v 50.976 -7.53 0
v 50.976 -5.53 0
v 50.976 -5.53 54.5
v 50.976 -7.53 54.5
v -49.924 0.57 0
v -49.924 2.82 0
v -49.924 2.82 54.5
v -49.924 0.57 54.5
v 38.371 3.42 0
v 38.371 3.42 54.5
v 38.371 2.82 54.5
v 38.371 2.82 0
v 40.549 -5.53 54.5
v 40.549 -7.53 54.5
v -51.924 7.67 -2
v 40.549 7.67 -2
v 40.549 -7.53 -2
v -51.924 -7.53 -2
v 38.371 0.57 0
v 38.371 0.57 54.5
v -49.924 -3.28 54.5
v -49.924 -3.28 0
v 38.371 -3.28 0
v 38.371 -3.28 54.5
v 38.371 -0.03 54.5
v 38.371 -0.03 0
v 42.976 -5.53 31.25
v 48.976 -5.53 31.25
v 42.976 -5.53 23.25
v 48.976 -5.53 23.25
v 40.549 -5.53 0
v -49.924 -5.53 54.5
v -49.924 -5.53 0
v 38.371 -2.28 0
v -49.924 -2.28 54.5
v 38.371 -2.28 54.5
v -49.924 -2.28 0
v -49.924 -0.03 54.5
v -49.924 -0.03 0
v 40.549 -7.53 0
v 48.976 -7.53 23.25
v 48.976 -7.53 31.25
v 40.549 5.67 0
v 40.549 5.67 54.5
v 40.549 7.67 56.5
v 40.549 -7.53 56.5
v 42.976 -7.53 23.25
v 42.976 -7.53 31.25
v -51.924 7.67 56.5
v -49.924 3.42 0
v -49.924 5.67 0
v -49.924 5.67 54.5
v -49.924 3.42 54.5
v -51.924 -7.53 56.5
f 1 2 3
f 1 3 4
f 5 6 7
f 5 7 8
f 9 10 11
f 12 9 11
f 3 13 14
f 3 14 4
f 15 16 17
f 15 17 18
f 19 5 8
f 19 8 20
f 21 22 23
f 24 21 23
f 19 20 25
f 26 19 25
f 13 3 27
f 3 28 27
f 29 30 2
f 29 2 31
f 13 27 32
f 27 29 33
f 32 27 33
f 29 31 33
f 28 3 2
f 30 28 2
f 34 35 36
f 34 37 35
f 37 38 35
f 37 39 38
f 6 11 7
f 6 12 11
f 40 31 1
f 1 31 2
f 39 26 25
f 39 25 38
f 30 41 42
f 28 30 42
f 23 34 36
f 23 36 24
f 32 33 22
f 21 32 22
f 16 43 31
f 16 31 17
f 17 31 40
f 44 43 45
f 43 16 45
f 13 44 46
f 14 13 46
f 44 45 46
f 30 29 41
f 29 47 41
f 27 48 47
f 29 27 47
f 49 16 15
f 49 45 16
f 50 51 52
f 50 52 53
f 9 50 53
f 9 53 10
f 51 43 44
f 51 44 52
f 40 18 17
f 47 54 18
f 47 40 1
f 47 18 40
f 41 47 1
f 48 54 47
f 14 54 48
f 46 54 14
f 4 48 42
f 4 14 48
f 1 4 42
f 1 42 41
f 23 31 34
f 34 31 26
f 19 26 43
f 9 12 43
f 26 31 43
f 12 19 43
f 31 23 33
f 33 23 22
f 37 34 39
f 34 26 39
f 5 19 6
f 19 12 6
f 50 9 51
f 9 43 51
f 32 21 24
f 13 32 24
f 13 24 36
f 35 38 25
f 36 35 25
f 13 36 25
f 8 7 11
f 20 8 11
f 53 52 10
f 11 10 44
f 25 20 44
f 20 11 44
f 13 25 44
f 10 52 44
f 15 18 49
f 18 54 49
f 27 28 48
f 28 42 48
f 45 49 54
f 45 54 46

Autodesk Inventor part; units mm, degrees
ref_plane "YZ Plane" through (0, 0, 0) normal (1, 0, 0) x (0, 1, 0)
ref_plane "XZ Plane" through (0, 0, 0) normal (0, 1, 0) x (-1, 0, 0)
ref_plane "XY Plane" through (0, 0, 0) normal (0, 0, 1) x (1, 0, 0)
sketch "Sketch1" plane through (0, 0, 0) normal (0, 0, 1) x (1, 0, 0)
  line L0 (-51.9238, 7.67) -> (40.5487, 7.67)
  line L1 (50.9762, -5.53) -> (50.9762, -7.53)
  line L2 (50.9762, -7.53) -> (-51.9238, -7.53)
  line L3 (-51.9238, -7.53) -> (-51.9238, 7.67)
  line L4 (-51.9238, 7.67) -> (50.9762, -7.53) construction
  line L5 (50.8142, 7.3691) -> (-51.9238, -7.53) construction
  line L6 (40.55, -5.53) -> (50.9762, -5.53)
  line L7 (40.5487, 5.67) -> (-49.9238, 5.67)
  line L8 (-49.9238, 5.67) -> (-49.9238, 3.42)
  line L9 (-49.9238, 3.42) -> (38.3707, 3.42)
  line L10 (40.5487, 7.67) -> (40.5487, 5.8804)
  line L11 (40.55, -5.53) -> (-49.9238, -5.53)
  line L12 (-49.9238, -5.53) -> (-49.9238, -3.28)
  line L13 (-49.9238, -3.28) -> (38.3707, -3.28)
  line L14 (40.5487, 5.8804) -> (40.5487, 5.67)
  line L15 (38.3707, 2.82) -> (-49.9238, 2.82)
  line L16 (-49.9238, 2.82) -> (-49.9238, 0.57)
  line L17 (-49.9238, 0.57) -> (38.3707, 0.57)
  line L18 (38.3707, 3.42) -> (38.3707, 2.82)
  line L19 (38.3707, -0.03) -> (-49.9238, -0.03)
  line L20 (-49.9238, -0.03) -> (-49.9238, -2.28)
  line L21 (-49.9238, -2.28) -> (38.3707, -2.28)
  line L22 (38.3707, 0.57) -> (38.3707, -0.03)
  line L23 (38.3707, -2.28) -> (38.3707, -3.28)
  point P0 (0, 0)
  dimension "d0" = 102.9
  dimension "d1" = 14.9
  dimension "d3" = 2
  dimension "d4" = 2
  dimension "d5" = 2.25
  dimension "d6" = 2
  dimension "d7" = 2
  dimension "d8" = 2.25
  dimension "d10" = 0.6
  dimension "d11" = 2.25
  dimension "d12" = 2
  dimension "d13" = 0.6
  dimension "d14" = 2.25
  dimension "d15" = 1
  dimension "d16" = 2
extrude "Extrusion1" add sketch "Sketch1" along normal blind 54.5
sketch "Sketch2" plane through (0, 0, 54.5) normal (0, 0, 1) x (1, 0, 0)
  line L0 (-51.9238, 7.67) -> (40.5487, 7.67) projected
  line L1 (50.9762, -7.53) -> (-51.9238, -7.53) projected
  line L2 (40.5487, 7.67) -> (-51.9238, 7.67)
  line L3 (-51.9238, 7.67) -> (-51.9238, -7.53)
  line L4 (-51.9238, -7.53) -> (40.5487, -7.53)
  line L5 (40.5487, -7.53) -> (40.5487, 7.67)
  point P0 (0, 0)
extrude "Extrusion2" add sketch "Sketch2" along normal blind 2
sketch "Sketch3" plane through (0, 0, 0) normal (0, 0, -1) x (-1, 0, 0)
  line L0 (-40.5487, 7.67) -> (-40.5487, 5.67) projected
  line L1 (51.9238, -7.53) -> (51.9238, 7.67) projected
  line L2 (-40.5487, 7.67) -> (51.9238, 7.67)
  line L3 (51.9238, 7.67) -> (51.9238, -7.53)
  line L4 (51.9238, -7.53) -> (-40.5487, -7.53)
  line L5 (-40.5487, -7.53) -> (-40.5487, 7.67)
  point P0 (0, 0)
extrude "Extrusion3" add sketch "Sketch3" along normal blind 2
sketch "Sketch4" plane through (40.5487, -7.53, 0) normal (0, -1, 0) x (1, 0, 0)
  line L0 (8.4275, 31.25) -> (2.4275, 31.25)
  line L1 (2.4275, 31.25) -> (2.4275, 23.25)
  line L2 (2.4275, 23.25) -> (8.4275, 23.25)
  line L3 (8.4275, 23.25) -> (8.4275, 31.25)
  line L4 (10.4275, 0) -> (10.4275, 54.5) projected
  line L5 (10.4275, 0) -> (0, 0) projected
  point P0 (-40.5487, 0)
  dimension "d23" = 2
  dimension "d24" = 8
  dimension "d25" = 6
  dimension "d26" = 23.25
extrude "Extrusion4" cut sketch "Sketch4" against normal blind 2
properties part number "CardBox_4slots"
